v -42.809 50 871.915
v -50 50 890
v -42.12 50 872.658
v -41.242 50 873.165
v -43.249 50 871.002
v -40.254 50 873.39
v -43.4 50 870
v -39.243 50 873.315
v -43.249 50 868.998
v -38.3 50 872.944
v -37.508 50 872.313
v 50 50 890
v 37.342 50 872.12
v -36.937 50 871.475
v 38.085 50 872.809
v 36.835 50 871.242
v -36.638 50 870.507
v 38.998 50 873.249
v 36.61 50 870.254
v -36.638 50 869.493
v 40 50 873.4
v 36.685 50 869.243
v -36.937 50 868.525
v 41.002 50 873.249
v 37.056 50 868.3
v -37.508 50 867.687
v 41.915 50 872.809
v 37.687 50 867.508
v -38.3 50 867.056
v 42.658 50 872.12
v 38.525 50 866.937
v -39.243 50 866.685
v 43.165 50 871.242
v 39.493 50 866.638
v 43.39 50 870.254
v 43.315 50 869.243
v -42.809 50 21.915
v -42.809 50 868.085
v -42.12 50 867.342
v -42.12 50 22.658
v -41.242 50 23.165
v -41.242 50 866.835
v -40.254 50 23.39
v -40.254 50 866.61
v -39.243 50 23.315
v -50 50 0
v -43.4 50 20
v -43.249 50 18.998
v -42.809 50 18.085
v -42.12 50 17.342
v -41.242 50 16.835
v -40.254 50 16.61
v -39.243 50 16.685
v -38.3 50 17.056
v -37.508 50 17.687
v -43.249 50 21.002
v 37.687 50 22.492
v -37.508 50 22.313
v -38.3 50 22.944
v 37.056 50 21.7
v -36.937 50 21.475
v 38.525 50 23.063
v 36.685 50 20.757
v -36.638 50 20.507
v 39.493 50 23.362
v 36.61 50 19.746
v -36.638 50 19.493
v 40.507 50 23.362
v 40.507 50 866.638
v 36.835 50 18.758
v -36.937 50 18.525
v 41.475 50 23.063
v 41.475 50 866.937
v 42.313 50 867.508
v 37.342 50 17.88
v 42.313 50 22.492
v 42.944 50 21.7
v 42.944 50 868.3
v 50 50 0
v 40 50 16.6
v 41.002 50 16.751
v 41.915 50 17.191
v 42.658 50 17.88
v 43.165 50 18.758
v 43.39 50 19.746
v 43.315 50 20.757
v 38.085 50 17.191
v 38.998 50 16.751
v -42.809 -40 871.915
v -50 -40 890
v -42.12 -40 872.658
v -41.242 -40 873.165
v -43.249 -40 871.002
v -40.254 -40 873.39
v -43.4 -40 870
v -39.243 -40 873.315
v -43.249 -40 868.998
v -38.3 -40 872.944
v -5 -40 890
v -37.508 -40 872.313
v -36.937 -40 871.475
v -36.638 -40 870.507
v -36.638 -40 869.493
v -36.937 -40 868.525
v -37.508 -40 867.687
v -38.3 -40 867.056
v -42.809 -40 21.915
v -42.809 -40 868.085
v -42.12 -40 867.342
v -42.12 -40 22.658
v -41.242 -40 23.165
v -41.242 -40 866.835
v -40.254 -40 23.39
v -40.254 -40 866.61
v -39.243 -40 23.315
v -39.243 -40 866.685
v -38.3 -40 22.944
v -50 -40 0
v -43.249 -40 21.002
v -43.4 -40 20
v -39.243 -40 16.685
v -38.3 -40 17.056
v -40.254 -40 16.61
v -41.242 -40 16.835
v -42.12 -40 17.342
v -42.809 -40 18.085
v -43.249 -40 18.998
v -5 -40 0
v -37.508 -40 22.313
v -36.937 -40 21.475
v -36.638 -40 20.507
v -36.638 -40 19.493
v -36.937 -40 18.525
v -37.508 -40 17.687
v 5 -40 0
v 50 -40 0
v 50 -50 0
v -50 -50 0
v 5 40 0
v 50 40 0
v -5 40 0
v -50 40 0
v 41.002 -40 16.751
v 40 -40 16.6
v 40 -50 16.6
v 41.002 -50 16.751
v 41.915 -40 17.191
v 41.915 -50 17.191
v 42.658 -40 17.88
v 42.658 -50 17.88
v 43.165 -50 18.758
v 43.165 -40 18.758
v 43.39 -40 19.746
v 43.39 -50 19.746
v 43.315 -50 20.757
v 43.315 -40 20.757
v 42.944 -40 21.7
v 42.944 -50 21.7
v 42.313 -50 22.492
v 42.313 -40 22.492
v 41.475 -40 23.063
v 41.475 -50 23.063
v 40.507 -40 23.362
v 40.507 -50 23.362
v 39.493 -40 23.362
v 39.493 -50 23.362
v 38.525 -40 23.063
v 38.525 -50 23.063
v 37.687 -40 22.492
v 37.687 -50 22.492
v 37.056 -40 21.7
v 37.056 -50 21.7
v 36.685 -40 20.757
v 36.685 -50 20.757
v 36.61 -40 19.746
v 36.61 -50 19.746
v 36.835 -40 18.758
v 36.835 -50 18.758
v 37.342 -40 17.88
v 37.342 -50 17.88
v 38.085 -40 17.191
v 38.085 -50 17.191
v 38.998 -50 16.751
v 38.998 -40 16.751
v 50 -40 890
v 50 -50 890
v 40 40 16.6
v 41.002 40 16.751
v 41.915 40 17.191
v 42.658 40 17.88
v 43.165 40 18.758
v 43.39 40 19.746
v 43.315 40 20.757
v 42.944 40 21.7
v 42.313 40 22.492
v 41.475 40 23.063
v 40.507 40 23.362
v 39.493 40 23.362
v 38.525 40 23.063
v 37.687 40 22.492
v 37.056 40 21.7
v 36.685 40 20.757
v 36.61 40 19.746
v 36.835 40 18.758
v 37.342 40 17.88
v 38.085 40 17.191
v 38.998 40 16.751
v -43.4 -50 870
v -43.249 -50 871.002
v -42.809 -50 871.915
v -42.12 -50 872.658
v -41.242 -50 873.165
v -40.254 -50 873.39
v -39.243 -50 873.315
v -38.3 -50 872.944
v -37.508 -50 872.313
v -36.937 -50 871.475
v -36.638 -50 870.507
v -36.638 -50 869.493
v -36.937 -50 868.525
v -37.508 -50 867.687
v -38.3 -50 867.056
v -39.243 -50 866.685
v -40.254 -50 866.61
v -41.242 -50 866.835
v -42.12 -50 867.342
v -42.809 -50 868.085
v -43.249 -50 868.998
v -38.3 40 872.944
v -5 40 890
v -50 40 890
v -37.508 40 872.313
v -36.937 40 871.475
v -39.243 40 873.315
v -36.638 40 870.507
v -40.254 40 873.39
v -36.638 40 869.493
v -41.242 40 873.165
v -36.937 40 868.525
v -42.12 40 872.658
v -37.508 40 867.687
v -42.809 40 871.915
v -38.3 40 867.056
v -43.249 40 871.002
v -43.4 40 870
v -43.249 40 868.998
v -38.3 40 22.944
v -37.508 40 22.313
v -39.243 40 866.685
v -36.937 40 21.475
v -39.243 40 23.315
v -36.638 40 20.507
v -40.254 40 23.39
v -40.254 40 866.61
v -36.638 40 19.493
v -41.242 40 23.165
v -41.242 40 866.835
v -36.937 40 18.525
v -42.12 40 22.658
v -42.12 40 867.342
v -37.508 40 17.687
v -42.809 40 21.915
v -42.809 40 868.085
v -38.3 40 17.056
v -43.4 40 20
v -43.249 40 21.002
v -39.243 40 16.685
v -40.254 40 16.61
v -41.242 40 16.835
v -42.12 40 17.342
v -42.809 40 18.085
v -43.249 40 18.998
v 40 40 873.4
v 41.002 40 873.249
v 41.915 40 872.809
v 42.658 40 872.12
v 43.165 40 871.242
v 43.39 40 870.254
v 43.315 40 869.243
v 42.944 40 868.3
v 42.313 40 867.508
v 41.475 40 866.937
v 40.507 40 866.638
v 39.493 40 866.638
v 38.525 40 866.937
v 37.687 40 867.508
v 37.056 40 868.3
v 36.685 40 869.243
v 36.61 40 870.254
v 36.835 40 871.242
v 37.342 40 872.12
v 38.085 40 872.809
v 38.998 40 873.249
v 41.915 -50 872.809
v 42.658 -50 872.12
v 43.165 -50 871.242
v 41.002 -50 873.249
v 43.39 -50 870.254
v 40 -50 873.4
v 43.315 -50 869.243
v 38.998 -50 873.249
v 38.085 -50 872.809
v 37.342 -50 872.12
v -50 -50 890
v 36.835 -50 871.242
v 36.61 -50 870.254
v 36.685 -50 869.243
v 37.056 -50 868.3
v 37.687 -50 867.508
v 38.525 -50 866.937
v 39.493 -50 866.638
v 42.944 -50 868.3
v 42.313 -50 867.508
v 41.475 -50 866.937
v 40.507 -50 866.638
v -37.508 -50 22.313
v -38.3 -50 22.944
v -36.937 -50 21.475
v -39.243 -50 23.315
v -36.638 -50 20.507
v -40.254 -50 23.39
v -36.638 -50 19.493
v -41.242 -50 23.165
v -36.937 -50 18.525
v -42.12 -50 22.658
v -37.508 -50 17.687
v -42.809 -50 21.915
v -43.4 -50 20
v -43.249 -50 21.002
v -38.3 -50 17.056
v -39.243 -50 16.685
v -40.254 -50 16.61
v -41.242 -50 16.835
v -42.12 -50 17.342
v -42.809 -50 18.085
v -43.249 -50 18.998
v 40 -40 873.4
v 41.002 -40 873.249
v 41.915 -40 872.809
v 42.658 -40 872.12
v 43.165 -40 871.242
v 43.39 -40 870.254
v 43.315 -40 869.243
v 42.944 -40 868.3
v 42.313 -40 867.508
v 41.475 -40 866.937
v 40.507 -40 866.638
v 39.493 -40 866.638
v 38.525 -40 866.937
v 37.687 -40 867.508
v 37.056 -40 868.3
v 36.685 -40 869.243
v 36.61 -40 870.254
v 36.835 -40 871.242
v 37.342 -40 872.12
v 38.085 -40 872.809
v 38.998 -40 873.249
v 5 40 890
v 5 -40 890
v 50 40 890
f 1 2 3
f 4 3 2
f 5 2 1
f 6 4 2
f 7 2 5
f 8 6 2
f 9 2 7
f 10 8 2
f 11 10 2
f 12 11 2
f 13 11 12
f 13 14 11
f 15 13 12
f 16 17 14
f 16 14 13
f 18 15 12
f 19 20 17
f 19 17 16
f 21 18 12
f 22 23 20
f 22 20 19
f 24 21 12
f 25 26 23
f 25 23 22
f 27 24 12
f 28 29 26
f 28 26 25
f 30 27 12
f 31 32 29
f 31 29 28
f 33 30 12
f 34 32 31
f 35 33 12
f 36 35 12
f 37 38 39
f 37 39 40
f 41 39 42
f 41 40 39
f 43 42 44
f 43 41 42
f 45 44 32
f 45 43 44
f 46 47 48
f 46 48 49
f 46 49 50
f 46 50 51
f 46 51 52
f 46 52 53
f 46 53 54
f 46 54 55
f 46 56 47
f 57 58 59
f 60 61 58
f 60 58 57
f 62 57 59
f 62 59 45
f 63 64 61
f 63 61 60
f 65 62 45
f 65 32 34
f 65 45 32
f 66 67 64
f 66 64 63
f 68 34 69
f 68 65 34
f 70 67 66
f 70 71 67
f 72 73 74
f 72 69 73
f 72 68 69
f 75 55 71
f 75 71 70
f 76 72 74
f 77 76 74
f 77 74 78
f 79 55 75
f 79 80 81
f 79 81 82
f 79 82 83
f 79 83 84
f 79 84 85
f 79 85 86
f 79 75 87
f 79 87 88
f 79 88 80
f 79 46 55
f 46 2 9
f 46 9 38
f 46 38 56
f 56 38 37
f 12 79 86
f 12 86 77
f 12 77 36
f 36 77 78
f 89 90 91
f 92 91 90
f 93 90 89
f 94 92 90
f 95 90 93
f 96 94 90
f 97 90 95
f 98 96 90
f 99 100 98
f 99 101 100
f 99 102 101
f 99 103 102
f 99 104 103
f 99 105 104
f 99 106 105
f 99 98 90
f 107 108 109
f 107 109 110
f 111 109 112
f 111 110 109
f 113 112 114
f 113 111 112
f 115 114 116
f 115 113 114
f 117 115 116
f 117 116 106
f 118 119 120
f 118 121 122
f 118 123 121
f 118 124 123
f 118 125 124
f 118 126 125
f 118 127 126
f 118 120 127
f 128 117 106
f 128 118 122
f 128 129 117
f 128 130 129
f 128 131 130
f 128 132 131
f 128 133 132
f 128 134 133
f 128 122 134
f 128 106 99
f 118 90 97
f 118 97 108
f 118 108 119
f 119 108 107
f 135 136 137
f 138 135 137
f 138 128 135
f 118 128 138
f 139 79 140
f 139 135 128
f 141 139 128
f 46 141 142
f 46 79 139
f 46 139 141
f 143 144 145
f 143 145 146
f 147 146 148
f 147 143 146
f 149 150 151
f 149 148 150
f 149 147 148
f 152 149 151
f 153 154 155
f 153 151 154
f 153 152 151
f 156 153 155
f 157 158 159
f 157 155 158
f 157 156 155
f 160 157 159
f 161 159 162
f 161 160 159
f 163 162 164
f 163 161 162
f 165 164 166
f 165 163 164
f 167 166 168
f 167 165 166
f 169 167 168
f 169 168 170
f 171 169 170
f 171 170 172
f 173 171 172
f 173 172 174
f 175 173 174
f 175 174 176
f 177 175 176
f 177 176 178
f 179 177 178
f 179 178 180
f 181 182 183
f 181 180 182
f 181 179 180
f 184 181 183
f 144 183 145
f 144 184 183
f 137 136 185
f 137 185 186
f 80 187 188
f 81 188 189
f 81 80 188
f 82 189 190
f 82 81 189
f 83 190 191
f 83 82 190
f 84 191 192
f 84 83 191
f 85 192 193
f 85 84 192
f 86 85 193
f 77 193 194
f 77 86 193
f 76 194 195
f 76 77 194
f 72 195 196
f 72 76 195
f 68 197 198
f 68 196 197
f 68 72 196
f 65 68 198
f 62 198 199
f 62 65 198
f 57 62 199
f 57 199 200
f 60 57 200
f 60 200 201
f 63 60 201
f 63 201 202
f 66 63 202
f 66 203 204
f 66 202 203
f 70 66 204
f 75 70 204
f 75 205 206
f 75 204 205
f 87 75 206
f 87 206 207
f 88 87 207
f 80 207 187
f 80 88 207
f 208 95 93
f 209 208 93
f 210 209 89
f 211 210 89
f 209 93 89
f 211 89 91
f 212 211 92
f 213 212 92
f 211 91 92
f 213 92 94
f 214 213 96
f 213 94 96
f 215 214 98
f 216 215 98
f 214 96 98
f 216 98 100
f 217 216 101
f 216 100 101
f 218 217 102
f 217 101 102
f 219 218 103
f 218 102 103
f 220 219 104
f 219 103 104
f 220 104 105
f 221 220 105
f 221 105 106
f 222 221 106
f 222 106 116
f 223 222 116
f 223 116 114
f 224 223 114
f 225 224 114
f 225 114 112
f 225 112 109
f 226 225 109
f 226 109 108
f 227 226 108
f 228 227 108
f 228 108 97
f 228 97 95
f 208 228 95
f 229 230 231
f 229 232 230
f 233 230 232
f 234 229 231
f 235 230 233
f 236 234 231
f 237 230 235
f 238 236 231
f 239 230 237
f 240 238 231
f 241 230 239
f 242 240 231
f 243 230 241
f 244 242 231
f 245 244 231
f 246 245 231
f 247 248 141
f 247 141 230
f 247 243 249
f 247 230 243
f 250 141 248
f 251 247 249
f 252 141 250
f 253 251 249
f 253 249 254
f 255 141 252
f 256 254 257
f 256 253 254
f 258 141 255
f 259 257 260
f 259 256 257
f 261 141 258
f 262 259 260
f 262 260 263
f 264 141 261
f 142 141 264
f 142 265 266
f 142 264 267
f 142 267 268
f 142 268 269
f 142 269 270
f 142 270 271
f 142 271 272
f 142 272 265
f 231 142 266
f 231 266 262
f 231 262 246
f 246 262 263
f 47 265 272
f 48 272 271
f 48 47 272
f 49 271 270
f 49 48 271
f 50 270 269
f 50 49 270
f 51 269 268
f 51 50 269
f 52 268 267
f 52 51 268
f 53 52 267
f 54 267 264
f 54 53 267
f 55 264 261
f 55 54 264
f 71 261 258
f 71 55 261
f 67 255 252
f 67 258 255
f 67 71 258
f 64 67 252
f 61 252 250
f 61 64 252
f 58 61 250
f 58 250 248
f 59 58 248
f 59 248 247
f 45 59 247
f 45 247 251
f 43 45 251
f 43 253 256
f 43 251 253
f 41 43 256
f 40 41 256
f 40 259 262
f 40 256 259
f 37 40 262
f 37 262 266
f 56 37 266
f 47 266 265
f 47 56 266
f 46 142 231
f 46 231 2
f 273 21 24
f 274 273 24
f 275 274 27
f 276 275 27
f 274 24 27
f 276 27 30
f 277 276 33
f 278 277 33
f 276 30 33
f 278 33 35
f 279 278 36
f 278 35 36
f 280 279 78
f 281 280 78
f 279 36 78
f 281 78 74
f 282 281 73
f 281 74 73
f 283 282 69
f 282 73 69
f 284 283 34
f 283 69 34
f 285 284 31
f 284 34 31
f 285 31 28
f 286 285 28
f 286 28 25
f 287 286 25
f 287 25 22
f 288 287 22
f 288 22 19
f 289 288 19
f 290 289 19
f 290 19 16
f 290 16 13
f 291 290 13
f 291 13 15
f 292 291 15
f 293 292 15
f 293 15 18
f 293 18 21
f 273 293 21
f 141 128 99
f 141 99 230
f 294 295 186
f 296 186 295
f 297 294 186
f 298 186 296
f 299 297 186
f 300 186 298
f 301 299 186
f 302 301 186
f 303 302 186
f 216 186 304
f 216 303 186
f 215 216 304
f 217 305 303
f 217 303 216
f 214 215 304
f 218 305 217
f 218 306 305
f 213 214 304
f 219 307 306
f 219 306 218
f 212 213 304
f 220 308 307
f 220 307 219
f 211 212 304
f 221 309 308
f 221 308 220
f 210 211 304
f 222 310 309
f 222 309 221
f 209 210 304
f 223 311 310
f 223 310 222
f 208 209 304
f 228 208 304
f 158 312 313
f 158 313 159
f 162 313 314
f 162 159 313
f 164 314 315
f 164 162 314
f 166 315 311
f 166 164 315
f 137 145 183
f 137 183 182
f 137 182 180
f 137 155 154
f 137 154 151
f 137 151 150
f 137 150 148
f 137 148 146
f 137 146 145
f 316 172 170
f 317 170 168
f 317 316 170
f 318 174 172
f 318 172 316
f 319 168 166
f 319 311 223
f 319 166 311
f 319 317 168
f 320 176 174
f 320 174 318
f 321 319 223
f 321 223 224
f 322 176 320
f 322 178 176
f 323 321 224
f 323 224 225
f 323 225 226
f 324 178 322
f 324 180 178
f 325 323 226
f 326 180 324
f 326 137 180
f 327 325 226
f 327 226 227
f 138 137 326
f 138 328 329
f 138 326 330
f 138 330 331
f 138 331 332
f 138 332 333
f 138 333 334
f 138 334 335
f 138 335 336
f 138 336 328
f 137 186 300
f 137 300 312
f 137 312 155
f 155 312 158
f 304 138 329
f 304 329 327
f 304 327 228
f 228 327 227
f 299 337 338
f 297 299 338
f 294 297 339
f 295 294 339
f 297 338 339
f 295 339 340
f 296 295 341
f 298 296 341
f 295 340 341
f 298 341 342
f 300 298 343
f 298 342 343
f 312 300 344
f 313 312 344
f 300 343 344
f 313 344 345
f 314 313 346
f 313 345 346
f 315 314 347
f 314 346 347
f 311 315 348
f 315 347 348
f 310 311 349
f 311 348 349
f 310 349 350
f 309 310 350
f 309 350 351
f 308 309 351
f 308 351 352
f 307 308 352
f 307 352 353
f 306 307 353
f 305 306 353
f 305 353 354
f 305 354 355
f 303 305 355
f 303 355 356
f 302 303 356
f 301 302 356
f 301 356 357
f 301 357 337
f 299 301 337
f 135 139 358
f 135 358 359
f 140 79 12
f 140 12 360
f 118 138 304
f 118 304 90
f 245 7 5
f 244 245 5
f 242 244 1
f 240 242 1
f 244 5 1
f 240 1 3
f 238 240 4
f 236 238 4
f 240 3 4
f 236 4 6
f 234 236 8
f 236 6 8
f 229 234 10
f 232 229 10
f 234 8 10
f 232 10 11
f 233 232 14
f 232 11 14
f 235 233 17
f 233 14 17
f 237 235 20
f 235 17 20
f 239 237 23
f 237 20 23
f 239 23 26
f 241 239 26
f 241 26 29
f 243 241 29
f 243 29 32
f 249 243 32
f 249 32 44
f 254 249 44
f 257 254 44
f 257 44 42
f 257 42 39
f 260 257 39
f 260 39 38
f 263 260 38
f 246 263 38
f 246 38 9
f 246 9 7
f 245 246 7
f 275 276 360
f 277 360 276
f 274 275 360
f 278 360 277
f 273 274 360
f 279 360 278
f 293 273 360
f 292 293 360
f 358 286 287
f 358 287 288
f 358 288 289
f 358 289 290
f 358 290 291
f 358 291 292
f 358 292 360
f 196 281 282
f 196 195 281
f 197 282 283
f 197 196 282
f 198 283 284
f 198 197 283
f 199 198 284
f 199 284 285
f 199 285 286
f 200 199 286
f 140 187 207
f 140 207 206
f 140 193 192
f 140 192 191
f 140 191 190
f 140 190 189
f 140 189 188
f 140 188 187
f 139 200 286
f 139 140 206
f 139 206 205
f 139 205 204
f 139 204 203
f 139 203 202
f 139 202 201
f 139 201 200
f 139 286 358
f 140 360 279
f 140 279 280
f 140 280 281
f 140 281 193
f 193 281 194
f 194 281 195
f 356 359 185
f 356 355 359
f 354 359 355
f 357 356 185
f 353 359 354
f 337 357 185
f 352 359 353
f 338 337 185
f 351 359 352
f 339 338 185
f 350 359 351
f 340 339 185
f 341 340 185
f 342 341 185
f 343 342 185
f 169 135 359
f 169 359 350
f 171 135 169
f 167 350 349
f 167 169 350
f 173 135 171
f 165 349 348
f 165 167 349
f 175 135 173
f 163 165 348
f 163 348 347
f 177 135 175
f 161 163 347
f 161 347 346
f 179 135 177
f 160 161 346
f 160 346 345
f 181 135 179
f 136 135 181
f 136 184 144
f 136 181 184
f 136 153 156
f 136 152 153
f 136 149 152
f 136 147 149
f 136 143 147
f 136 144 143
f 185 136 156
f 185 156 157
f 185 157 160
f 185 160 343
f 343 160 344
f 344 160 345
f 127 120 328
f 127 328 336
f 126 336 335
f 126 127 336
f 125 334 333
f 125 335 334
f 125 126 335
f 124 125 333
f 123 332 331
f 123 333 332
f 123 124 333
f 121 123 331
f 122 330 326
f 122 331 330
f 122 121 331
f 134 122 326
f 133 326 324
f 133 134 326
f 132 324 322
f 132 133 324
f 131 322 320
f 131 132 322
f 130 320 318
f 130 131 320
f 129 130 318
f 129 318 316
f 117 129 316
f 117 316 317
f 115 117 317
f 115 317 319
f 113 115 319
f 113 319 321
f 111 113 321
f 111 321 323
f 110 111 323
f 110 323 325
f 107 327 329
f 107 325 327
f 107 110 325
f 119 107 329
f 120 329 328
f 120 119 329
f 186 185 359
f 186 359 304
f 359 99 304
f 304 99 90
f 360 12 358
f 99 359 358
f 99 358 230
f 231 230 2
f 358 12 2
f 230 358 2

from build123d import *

# Parameters (mm, degrees)
AUFSATZ_LINEAR_AUSTRAGEN1_DEPTH = 890
SKIZZE2_R                       = 3.4
SCHNITT_LINEAR_AUSTRAGEN1_DEPTH = 897.994983264


with BuildPart() as part:
    # Skizze1 → Aufsatz-Linear austragen1 (new body)
    with BuildSketch(Plane.XY):
        Polygon((-50, 50), (50, 50), (50, 40), (5, 40), (5, -40), (50, -40), (50, -50), (-50, -50), (-50, -40), (-5, -40), (-5, 40), (-50, 40), align=None)
    extrude(amount=AUFSATZ_LINEAR_AUSTRAGEN1_DEPTH)

    # Skizze2 → Schnitt-Linear austragen1 (cut, through all)
    with BuildSketch(Plane(origin=(0, 50, 0), x_dir=(1, 0, 0), z_dir=(0, 1, 0))):
        with Locations(Location((40, -870, 0), (0, 0, 270))):
            Circle(SKIZZE2_R)
        with Locations(Location((-40, -870, 0), (0, 0, 180))):
            Circle(SKIZZE2_R)
    schnitt_linear_austragen1 = extrude(amount=-SCHNITT_LINEAR_AUSTRAGEN1_DEPTH, mode=Mode.SUBTRACT)

    # Spiegeln1: Schnitt-Linear austragen1 across plane
    add(schnitt_linear_austragen1.mirror(Plane.XY.offset(445)), mode=Mode.SUBTRACT)


solid = part.part
